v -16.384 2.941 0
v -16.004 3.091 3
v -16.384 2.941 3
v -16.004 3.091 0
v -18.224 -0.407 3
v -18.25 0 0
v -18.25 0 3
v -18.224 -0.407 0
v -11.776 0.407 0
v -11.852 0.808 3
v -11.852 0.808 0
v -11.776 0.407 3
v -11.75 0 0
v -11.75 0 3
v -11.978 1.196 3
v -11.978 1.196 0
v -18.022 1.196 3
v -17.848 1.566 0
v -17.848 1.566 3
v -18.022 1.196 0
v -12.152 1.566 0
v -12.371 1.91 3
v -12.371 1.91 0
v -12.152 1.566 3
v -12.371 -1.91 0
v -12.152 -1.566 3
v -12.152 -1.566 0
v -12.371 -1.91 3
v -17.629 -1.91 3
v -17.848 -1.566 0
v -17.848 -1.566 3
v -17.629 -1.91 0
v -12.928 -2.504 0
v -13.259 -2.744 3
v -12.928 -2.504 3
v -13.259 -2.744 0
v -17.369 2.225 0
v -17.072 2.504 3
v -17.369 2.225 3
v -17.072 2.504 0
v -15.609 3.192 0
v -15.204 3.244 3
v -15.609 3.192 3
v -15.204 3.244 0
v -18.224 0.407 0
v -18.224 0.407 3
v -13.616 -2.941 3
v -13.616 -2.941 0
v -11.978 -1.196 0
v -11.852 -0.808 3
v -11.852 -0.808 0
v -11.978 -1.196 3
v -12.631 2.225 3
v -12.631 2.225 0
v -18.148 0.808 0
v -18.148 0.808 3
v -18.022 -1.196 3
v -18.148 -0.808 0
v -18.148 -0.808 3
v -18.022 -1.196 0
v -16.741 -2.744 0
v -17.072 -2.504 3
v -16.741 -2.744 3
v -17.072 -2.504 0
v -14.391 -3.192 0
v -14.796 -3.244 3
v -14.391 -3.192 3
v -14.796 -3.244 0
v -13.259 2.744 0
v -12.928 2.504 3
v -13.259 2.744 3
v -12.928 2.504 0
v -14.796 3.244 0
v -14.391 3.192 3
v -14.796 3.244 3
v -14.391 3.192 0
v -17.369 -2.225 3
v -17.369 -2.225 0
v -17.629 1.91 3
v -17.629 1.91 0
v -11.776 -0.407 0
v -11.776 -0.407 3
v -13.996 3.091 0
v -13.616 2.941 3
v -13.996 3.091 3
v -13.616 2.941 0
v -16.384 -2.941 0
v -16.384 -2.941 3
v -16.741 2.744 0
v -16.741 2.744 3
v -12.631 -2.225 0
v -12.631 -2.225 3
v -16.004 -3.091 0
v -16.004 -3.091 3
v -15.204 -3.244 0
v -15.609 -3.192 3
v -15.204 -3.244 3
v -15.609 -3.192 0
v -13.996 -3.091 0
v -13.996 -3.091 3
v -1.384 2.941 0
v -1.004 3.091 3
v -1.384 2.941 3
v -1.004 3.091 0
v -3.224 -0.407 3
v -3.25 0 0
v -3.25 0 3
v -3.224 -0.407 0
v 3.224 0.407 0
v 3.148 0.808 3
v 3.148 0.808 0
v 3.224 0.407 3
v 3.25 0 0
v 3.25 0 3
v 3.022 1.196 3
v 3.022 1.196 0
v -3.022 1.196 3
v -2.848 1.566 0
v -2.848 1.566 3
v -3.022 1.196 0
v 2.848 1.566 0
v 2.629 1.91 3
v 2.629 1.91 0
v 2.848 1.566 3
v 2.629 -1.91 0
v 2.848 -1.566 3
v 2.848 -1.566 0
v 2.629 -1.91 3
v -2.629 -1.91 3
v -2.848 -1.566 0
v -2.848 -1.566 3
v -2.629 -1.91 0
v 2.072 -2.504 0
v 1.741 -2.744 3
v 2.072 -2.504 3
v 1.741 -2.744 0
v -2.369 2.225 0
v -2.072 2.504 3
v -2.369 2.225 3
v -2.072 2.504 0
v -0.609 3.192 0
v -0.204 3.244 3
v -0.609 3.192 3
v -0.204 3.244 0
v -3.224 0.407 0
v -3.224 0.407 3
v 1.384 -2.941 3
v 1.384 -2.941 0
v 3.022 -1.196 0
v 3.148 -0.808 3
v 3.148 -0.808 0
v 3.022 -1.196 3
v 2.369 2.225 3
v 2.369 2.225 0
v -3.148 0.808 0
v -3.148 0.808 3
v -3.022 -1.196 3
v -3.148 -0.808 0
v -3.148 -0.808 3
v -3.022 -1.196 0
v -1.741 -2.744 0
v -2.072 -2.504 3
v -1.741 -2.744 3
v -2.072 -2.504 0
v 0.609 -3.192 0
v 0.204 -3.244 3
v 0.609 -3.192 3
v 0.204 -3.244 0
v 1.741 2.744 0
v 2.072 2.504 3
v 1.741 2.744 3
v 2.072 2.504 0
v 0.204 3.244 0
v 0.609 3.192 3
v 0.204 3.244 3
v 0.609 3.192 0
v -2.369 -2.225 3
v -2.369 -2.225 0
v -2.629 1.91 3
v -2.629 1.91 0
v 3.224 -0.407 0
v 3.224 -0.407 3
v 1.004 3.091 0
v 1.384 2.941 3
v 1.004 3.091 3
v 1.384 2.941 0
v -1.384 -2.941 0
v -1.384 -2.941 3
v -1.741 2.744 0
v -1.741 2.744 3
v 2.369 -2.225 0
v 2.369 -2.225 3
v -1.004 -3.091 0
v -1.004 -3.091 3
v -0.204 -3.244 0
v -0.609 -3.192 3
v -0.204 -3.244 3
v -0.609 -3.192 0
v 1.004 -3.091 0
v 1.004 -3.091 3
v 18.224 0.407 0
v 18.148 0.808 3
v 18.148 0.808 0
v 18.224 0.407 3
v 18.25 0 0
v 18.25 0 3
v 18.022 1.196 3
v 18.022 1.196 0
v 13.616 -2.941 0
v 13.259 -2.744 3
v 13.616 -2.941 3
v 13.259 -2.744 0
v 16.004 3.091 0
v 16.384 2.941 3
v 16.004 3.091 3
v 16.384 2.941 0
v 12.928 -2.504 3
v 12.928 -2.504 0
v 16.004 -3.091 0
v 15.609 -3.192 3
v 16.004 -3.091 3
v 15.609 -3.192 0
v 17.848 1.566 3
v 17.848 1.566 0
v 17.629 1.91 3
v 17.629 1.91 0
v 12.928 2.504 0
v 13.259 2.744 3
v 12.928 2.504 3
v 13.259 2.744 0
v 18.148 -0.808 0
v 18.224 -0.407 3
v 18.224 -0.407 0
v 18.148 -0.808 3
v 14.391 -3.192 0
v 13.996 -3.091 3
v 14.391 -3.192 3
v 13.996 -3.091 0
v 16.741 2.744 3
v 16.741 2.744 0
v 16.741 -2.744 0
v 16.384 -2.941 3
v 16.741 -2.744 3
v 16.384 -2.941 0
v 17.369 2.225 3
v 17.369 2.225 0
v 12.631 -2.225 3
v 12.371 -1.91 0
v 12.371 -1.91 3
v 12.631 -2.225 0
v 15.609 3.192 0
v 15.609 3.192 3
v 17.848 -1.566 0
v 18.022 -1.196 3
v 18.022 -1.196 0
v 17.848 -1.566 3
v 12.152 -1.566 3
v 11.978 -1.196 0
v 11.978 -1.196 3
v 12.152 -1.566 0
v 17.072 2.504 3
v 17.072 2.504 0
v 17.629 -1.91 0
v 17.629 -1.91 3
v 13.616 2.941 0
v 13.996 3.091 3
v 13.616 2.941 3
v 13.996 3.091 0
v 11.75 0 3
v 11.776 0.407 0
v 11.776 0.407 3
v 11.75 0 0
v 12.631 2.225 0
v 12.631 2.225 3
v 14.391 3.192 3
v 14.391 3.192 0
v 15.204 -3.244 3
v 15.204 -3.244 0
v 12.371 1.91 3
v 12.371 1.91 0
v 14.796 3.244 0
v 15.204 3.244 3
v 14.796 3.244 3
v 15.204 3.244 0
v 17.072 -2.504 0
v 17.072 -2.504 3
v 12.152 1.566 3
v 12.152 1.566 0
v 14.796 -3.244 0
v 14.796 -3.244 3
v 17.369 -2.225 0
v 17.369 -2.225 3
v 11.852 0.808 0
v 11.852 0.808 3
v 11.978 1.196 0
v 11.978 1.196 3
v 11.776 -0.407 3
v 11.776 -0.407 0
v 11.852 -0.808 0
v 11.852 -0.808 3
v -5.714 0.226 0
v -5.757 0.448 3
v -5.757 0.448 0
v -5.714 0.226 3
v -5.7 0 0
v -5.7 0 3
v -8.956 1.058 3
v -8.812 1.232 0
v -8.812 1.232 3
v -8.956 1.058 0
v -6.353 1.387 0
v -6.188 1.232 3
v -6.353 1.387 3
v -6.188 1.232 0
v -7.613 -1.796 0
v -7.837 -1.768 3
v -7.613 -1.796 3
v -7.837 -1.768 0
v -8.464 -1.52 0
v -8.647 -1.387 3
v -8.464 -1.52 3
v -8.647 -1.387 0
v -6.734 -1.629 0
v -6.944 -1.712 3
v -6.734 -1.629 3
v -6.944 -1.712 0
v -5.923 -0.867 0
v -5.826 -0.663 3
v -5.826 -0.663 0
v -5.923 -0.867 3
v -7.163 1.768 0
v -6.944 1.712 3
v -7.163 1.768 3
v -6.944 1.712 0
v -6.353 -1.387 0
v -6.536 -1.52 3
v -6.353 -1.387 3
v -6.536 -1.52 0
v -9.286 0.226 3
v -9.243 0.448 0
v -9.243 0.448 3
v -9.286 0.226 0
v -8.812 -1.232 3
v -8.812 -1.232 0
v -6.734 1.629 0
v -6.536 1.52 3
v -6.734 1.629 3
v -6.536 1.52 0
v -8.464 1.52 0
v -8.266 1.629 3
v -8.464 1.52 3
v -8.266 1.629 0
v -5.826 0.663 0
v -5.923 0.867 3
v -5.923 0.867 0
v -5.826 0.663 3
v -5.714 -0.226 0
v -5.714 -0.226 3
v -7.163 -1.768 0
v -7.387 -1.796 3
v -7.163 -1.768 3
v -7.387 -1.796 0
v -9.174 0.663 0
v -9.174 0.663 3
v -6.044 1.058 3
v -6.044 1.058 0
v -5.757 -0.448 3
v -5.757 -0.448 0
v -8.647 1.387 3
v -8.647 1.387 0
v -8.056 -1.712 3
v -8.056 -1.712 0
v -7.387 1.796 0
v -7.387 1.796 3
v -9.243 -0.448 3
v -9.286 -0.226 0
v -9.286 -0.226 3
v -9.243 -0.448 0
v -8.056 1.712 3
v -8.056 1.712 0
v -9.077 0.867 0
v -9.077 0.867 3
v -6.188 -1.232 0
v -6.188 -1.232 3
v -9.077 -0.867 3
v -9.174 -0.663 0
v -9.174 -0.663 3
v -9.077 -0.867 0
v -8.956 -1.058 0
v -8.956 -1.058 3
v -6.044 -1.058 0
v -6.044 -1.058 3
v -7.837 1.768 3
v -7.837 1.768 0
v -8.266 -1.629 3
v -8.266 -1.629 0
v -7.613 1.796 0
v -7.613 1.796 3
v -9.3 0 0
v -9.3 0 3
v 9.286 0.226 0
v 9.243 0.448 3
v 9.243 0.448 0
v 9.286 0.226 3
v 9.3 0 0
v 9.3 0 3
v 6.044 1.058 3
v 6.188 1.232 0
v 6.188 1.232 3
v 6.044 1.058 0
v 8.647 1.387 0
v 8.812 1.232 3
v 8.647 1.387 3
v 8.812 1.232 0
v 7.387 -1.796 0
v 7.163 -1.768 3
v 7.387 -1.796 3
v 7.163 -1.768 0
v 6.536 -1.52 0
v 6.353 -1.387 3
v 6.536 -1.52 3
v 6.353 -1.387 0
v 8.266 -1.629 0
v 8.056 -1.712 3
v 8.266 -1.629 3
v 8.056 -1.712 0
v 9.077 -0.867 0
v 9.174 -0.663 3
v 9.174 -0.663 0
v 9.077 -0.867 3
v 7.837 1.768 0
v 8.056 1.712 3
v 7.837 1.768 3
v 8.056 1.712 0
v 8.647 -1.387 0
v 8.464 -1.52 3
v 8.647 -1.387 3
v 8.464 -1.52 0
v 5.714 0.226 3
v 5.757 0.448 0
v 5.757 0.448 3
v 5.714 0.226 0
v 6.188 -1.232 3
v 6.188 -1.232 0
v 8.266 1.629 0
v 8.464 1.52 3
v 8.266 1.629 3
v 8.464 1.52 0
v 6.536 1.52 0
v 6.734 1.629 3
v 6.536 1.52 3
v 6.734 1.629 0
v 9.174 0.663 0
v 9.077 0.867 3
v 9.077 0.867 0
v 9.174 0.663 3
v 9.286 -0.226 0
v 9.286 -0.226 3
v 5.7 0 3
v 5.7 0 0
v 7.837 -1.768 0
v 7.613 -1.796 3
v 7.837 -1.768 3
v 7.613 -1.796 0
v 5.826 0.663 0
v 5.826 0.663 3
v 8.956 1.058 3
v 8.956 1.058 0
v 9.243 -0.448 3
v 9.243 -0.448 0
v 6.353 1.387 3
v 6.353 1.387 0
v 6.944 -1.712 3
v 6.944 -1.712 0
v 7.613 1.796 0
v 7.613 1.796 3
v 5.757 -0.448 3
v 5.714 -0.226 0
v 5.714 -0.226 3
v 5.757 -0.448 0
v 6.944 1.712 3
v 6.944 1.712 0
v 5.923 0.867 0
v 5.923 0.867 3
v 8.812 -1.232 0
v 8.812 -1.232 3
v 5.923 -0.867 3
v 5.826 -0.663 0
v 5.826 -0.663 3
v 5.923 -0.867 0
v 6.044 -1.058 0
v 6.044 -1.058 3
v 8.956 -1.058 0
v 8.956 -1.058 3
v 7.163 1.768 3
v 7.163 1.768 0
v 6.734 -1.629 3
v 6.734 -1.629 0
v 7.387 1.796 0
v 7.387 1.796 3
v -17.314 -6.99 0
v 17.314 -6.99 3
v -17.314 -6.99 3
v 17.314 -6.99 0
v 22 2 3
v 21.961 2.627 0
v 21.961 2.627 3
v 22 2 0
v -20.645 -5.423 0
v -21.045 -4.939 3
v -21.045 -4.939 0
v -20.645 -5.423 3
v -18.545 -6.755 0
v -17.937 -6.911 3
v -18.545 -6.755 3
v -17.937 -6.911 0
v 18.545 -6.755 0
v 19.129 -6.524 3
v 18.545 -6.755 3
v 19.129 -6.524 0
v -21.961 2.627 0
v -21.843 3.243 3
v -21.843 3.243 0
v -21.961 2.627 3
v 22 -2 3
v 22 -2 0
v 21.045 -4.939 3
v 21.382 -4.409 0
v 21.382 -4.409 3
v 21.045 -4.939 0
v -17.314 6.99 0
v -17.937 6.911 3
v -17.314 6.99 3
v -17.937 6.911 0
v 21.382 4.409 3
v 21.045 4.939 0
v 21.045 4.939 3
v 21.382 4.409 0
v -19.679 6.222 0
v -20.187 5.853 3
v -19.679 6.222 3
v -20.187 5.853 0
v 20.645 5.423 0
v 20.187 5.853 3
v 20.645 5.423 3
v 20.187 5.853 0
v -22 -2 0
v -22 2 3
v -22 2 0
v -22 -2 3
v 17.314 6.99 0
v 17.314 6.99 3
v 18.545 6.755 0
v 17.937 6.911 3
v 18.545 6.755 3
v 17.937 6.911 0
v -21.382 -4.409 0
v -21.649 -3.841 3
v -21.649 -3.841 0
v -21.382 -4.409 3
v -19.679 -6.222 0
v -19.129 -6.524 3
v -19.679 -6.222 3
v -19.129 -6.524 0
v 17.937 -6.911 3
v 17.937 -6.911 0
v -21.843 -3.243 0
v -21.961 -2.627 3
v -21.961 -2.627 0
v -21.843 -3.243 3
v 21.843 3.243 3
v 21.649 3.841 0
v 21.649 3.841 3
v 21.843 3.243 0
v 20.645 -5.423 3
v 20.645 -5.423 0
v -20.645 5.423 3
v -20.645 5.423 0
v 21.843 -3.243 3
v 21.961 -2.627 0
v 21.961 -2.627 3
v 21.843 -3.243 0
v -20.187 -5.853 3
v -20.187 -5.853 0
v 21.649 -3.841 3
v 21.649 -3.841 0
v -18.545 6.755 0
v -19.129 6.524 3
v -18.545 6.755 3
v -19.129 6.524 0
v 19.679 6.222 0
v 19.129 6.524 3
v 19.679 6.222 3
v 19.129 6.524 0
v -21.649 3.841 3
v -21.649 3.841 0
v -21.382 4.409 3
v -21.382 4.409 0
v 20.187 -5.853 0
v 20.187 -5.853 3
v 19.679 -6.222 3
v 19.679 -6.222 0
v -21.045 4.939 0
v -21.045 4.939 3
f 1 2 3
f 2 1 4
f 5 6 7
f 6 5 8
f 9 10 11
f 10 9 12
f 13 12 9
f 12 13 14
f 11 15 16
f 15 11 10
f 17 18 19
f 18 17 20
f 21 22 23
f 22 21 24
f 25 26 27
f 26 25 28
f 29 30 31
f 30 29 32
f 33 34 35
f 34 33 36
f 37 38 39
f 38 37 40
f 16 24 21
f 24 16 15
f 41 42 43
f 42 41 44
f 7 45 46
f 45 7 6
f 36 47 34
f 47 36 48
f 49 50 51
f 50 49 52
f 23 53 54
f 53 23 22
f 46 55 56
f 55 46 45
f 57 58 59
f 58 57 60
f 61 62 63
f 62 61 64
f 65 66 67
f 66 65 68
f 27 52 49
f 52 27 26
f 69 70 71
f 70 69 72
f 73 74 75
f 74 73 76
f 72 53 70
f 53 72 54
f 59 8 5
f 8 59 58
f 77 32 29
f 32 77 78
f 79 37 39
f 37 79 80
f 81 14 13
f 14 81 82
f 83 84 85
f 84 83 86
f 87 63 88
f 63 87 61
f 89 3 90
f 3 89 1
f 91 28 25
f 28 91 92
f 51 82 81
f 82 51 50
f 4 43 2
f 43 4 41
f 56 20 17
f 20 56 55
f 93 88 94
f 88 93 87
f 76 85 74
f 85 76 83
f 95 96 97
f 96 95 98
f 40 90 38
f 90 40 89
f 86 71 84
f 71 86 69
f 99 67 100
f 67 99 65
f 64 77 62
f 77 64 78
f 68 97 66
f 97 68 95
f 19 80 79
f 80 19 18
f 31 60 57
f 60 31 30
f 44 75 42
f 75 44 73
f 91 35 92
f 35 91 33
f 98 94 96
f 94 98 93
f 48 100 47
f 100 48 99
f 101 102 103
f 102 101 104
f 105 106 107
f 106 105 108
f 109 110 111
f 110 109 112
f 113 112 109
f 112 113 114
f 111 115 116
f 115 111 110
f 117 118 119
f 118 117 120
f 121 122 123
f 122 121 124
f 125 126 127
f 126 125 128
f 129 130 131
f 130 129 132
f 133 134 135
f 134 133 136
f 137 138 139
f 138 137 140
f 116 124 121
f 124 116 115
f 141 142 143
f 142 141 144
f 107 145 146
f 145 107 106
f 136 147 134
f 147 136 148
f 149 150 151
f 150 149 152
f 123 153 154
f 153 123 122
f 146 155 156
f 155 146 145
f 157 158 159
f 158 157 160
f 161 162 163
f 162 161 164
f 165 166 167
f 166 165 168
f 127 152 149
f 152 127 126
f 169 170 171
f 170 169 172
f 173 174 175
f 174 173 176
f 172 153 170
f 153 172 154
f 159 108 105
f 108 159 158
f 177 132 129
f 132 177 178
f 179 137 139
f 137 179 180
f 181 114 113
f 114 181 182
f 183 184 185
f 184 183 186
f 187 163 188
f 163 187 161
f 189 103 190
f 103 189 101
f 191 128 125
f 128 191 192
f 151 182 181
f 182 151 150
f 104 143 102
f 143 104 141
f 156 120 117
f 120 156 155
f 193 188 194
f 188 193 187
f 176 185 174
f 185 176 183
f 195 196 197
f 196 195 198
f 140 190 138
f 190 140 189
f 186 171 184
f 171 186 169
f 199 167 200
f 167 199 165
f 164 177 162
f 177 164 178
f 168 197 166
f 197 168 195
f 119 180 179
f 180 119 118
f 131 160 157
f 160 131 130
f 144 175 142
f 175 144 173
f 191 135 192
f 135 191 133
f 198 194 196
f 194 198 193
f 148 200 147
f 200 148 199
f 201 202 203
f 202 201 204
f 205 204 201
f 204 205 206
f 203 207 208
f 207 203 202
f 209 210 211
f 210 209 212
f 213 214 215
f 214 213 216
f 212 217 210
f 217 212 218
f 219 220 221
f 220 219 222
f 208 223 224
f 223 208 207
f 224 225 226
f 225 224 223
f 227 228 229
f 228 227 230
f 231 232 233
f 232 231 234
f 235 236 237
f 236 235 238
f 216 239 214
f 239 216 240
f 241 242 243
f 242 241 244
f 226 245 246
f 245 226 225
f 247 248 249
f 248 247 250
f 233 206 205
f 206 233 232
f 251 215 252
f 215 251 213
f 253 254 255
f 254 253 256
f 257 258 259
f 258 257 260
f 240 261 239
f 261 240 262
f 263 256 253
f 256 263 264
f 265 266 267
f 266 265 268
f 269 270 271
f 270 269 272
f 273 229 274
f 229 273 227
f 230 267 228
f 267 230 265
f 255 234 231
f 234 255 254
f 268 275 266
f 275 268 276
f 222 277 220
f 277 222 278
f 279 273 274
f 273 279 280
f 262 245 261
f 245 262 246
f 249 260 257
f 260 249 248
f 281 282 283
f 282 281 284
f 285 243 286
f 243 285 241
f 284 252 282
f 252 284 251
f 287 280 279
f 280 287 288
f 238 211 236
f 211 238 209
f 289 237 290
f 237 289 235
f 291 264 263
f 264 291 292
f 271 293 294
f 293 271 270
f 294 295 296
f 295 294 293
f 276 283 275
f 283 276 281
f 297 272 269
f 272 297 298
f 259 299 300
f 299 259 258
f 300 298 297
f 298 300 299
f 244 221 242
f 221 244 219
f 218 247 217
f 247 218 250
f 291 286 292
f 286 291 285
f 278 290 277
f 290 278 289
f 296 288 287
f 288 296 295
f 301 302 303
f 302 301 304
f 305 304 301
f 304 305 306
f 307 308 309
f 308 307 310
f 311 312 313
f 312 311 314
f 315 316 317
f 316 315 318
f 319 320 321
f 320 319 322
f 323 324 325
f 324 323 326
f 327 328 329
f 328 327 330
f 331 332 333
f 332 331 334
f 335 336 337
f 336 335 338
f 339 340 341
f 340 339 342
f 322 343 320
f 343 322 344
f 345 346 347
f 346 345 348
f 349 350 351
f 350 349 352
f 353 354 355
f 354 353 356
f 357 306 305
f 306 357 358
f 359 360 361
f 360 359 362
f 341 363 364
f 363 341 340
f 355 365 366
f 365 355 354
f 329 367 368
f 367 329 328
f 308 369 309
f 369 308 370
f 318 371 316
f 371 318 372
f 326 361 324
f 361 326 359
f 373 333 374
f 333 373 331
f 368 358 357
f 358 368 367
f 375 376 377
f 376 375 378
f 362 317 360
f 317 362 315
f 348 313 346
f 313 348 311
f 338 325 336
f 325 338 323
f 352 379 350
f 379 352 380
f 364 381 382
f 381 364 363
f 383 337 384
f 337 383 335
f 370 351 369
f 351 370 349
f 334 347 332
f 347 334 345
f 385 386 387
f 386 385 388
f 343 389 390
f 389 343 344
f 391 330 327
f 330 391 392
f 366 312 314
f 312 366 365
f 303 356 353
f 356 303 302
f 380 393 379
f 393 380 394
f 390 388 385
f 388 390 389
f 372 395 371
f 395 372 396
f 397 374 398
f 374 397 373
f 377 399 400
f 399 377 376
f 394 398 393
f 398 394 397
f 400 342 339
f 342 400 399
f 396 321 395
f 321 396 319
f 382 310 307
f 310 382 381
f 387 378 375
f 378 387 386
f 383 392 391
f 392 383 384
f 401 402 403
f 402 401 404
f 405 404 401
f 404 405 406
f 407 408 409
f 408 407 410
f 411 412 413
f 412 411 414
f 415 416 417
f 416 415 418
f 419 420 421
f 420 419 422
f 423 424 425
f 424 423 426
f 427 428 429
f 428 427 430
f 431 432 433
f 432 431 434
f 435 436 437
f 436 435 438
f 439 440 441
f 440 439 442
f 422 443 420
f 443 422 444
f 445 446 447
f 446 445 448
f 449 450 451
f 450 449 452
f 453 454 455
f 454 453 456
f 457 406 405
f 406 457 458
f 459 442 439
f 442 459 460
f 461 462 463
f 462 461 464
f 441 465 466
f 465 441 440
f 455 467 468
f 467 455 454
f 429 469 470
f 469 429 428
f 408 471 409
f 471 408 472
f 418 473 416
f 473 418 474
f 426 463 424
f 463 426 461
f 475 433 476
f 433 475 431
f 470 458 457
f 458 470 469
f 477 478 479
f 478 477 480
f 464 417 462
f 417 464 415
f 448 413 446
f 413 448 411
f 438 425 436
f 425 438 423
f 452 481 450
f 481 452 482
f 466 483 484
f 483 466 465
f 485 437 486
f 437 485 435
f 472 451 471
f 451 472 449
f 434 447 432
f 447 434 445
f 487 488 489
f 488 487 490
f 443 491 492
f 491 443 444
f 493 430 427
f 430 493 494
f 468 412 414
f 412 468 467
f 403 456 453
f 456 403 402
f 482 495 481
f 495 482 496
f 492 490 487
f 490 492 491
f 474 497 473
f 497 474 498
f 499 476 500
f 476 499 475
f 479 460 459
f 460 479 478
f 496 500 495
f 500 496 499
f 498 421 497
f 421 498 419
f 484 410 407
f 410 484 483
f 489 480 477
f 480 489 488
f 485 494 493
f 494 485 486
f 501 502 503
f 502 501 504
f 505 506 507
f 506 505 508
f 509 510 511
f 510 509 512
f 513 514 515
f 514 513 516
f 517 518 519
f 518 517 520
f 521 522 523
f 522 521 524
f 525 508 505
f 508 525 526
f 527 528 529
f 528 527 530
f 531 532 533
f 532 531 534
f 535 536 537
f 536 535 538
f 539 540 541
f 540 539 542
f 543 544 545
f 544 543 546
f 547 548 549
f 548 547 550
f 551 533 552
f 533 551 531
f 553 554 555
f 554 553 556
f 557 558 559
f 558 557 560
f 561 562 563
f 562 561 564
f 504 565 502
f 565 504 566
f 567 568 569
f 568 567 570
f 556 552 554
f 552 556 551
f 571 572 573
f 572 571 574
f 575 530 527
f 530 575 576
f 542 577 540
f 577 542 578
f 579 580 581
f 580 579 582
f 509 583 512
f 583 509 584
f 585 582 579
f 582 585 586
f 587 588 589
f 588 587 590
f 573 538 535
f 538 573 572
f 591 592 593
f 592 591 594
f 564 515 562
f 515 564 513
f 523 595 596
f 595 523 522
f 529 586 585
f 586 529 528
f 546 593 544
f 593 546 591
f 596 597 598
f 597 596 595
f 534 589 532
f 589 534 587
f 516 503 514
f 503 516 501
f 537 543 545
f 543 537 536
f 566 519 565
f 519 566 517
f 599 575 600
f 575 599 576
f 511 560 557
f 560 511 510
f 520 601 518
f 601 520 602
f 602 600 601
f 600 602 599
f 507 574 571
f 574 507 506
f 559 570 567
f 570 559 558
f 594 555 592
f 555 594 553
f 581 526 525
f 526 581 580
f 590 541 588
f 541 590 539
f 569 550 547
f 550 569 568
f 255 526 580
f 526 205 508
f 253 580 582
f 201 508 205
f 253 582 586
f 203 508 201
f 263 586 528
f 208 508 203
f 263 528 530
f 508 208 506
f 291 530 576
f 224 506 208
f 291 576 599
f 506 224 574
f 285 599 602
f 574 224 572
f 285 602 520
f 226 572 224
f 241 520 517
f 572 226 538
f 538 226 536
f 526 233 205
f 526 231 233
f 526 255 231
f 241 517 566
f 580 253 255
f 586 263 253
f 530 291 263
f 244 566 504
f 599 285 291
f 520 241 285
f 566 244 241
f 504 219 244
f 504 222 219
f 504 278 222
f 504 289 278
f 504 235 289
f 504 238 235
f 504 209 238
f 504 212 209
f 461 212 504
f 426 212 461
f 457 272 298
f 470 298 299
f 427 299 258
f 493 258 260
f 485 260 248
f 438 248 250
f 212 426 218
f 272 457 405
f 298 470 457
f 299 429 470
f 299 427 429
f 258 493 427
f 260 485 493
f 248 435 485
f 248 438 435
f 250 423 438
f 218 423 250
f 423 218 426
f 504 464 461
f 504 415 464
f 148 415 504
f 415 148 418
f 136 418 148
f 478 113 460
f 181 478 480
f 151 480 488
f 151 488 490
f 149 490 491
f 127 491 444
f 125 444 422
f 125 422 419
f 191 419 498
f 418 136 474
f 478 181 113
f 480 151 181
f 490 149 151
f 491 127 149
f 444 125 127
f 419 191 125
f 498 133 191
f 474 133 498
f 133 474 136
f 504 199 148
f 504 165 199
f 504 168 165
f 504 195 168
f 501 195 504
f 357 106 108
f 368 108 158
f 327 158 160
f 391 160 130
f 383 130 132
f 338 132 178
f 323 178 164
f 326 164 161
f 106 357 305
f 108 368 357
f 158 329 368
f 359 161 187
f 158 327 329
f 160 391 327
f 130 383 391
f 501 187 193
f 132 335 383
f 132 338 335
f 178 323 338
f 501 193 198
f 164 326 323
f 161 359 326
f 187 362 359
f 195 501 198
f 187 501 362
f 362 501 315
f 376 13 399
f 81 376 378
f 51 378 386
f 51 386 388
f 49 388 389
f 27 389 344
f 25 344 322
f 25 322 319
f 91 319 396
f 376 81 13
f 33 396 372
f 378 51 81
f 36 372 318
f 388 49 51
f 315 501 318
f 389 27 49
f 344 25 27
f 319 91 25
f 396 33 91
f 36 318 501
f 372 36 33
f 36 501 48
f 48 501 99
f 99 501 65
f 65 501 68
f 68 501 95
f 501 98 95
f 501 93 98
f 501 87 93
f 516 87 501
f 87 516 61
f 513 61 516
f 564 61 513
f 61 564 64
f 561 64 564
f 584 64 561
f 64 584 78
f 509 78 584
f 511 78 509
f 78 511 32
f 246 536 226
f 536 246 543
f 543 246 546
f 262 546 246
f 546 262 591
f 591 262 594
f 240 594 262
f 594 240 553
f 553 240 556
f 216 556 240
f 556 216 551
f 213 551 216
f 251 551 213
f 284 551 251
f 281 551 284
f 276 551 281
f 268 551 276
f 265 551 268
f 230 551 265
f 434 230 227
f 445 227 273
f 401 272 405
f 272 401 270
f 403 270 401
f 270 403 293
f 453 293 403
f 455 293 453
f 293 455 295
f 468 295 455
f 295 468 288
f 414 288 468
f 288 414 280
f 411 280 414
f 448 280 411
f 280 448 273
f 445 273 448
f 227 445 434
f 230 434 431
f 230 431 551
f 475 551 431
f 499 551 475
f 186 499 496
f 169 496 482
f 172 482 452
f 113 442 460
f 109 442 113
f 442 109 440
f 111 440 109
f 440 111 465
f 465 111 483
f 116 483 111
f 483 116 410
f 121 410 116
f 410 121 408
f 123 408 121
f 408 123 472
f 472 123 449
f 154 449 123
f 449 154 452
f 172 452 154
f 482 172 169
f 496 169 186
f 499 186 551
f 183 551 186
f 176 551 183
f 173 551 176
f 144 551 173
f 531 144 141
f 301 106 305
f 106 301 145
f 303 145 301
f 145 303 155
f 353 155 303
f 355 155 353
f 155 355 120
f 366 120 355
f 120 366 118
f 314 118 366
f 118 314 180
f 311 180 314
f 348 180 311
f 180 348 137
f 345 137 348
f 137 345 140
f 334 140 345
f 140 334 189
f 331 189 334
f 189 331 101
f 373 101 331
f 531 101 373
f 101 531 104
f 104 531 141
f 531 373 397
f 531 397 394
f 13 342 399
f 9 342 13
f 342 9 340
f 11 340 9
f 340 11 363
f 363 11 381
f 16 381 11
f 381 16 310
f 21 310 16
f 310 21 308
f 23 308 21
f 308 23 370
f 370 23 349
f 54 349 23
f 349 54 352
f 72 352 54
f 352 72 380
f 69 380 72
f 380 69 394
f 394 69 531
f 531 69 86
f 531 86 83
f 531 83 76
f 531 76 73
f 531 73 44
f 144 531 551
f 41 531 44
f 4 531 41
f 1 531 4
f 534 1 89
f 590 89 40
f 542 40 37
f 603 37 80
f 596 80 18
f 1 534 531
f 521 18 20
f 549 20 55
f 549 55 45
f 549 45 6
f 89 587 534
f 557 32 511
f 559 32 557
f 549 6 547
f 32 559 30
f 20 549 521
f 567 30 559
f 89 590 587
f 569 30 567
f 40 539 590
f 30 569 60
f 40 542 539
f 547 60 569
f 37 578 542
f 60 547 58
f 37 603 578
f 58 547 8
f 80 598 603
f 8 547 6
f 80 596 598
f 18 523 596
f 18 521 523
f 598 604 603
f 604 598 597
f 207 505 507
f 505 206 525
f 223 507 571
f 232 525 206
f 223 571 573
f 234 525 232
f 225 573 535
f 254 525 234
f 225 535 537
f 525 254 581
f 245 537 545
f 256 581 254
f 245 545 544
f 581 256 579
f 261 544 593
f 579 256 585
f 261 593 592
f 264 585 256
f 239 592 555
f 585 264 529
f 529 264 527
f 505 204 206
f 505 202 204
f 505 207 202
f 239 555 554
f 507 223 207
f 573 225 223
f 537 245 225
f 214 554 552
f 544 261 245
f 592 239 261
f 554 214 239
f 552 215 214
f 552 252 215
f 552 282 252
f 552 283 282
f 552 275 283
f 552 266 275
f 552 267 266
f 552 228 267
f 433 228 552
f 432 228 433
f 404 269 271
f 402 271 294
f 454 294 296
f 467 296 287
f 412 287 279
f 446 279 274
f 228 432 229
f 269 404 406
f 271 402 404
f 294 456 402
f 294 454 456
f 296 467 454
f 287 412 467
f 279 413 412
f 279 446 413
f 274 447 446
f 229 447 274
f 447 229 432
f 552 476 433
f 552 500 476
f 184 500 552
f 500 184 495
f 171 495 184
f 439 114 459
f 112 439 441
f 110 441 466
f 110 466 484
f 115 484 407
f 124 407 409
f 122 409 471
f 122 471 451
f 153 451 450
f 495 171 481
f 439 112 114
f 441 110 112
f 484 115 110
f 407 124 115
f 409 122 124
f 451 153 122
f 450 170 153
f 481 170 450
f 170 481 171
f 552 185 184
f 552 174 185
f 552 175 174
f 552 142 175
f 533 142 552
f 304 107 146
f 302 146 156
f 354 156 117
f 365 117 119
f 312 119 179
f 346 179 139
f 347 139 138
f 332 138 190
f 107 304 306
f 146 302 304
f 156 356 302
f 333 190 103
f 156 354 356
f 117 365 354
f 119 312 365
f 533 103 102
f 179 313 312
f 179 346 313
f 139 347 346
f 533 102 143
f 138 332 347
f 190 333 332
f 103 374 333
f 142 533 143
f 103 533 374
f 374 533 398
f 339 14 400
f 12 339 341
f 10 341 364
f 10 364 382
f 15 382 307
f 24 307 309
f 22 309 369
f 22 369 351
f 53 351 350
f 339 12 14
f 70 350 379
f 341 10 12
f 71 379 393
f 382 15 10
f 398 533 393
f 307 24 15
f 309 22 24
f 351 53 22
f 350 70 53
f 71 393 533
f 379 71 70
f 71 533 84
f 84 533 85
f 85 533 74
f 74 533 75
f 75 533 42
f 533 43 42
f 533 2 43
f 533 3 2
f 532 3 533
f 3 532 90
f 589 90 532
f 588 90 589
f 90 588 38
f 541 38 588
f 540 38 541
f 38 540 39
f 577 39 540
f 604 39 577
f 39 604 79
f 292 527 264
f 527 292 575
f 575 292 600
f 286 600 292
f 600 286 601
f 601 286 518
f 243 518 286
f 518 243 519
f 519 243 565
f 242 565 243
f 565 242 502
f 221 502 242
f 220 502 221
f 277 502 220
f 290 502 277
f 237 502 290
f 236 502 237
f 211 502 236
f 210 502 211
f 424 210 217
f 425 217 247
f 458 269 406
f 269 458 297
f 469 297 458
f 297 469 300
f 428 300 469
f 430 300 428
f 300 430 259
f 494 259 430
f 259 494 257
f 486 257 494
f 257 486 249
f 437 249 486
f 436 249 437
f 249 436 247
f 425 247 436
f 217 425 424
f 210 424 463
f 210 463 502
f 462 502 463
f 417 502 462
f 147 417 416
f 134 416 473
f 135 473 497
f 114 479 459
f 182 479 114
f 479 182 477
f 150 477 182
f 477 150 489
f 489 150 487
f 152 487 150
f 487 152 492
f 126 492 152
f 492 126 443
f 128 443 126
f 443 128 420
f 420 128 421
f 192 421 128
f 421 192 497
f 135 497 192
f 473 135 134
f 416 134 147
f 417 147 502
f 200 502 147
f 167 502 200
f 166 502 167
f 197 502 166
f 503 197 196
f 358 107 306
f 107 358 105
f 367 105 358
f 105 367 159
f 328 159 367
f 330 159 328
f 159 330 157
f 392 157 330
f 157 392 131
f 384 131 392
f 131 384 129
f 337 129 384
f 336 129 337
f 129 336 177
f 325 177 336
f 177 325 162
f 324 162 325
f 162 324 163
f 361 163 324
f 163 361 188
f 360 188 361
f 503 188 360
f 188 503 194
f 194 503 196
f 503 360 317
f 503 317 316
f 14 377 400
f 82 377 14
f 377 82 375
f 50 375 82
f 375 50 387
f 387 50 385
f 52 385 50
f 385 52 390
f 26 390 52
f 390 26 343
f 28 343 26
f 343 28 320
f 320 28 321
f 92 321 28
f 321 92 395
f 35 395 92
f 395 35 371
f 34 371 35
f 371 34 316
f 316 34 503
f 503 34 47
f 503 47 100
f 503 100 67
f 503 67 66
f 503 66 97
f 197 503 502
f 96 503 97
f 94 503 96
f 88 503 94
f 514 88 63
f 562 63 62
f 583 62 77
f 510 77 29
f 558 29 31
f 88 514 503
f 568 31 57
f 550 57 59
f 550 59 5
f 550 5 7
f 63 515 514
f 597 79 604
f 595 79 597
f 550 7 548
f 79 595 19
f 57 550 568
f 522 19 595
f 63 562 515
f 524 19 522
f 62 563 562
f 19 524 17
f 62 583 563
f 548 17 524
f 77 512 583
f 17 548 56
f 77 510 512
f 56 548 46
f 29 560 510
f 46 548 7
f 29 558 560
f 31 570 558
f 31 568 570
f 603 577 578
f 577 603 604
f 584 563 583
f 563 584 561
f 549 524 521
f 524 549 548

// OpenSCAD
$fn = 50;


difference() {
	union() {
		*translate(v = [0, 7, 0]) {
			linear_extrude(height = 1) {
				text(halign = "center", size = 4.5000000000, text = "COMMENT plate main", valign = "center");
			}
		}
		*translate(v = [0, 14, 0]) {
			linear_extrude(height = 1) {
				text(halign = "center", size = 4.5000000000, text = "COMMENT description oobb_plate_shape_p_type_3_depth_3_width_1_height_3_thickness_true_both_holes", valign = "center");
			}
		}
		hull() {
			translate(v = [-17.0000000000, 2.0000000000, 0]) {
				cylinder(h = 3, r = 5);
			}
			translate(v = [17.0000000000, 2.0000000000, 0]) {
				cylinder(h = 3, r = 5);
			}
			translate(v = [-17.0000000000, -2.0000000000, 0]) {
				cylinder(h = 3, r = 5);
			}
			translate(v = [17.0000000000, -2.0000000000, 0]) {
				cylinder(h = 3, r = 5);
			}
		}
	}
	union() {
		*translate(v = [0, 7, 0]) {
			linear_extrude(height = 1) {
				text(halign = "center", size = 4.5000000000, text = "COMMENT holes main", valign = "center");
			}
		}
		*translate(v = [0, 14, 0]) {
			linear_extrude(height = 1) {
				text(halign = "center", size = 4.5000000000, text = "COMMENT description oobb_holes_shape_n_type_3_width_1_height_3_thickness_true_both_holes", valign = "center");
			}
		}
		translate(v = [-15.0000000000, 0.0000000000, 0]) {
			translate(v = [0, 0, -50]) {
				cylinder(h = 100, r = 3.2500000000);
			}
		}
		translate(v = [0, 0, -50]) {
			cylinder(h = 100, r = 3.2500000000);
		}
		translate(v = [15.0000000000, 0.0000000000, 0]) {
			translate(v = [0, 0, -50]) {
				cylinder(h = 100, r = 3.2500000000);
			}
		}
		translate(v = [-15.0000000000, 0.0000000000, 0]) {
			translate(v = [0, 0, -50]) {
				cylinder(h = 100, r = 1.8000000000);
			}
		}
		translate(v = [-7.5000000000, 0.0000000000, 0]) {
			translate(v = [0, 0, -50]) {
				cylinder(h = 100, r = 1.8000000000);
			}
		}
		translate(v = [0, 0, -50]) {
			cylinder(h = 100, r = 1.8000000000);
		}
		translate(v = [7.5000000000, 0.0000000000, 0]) {
			translate(v = [0, 0, -50]) {
				cylinder(h = 100, r = 1.8000000000);
			}
		}
		translate(v = [15.0000000000, 0.0000000000, 0]) {
			translate(v = [0, 0, -50]) {
				cylinder(h = 100, r = 1.8000000000);
			}
		}
	}
}
